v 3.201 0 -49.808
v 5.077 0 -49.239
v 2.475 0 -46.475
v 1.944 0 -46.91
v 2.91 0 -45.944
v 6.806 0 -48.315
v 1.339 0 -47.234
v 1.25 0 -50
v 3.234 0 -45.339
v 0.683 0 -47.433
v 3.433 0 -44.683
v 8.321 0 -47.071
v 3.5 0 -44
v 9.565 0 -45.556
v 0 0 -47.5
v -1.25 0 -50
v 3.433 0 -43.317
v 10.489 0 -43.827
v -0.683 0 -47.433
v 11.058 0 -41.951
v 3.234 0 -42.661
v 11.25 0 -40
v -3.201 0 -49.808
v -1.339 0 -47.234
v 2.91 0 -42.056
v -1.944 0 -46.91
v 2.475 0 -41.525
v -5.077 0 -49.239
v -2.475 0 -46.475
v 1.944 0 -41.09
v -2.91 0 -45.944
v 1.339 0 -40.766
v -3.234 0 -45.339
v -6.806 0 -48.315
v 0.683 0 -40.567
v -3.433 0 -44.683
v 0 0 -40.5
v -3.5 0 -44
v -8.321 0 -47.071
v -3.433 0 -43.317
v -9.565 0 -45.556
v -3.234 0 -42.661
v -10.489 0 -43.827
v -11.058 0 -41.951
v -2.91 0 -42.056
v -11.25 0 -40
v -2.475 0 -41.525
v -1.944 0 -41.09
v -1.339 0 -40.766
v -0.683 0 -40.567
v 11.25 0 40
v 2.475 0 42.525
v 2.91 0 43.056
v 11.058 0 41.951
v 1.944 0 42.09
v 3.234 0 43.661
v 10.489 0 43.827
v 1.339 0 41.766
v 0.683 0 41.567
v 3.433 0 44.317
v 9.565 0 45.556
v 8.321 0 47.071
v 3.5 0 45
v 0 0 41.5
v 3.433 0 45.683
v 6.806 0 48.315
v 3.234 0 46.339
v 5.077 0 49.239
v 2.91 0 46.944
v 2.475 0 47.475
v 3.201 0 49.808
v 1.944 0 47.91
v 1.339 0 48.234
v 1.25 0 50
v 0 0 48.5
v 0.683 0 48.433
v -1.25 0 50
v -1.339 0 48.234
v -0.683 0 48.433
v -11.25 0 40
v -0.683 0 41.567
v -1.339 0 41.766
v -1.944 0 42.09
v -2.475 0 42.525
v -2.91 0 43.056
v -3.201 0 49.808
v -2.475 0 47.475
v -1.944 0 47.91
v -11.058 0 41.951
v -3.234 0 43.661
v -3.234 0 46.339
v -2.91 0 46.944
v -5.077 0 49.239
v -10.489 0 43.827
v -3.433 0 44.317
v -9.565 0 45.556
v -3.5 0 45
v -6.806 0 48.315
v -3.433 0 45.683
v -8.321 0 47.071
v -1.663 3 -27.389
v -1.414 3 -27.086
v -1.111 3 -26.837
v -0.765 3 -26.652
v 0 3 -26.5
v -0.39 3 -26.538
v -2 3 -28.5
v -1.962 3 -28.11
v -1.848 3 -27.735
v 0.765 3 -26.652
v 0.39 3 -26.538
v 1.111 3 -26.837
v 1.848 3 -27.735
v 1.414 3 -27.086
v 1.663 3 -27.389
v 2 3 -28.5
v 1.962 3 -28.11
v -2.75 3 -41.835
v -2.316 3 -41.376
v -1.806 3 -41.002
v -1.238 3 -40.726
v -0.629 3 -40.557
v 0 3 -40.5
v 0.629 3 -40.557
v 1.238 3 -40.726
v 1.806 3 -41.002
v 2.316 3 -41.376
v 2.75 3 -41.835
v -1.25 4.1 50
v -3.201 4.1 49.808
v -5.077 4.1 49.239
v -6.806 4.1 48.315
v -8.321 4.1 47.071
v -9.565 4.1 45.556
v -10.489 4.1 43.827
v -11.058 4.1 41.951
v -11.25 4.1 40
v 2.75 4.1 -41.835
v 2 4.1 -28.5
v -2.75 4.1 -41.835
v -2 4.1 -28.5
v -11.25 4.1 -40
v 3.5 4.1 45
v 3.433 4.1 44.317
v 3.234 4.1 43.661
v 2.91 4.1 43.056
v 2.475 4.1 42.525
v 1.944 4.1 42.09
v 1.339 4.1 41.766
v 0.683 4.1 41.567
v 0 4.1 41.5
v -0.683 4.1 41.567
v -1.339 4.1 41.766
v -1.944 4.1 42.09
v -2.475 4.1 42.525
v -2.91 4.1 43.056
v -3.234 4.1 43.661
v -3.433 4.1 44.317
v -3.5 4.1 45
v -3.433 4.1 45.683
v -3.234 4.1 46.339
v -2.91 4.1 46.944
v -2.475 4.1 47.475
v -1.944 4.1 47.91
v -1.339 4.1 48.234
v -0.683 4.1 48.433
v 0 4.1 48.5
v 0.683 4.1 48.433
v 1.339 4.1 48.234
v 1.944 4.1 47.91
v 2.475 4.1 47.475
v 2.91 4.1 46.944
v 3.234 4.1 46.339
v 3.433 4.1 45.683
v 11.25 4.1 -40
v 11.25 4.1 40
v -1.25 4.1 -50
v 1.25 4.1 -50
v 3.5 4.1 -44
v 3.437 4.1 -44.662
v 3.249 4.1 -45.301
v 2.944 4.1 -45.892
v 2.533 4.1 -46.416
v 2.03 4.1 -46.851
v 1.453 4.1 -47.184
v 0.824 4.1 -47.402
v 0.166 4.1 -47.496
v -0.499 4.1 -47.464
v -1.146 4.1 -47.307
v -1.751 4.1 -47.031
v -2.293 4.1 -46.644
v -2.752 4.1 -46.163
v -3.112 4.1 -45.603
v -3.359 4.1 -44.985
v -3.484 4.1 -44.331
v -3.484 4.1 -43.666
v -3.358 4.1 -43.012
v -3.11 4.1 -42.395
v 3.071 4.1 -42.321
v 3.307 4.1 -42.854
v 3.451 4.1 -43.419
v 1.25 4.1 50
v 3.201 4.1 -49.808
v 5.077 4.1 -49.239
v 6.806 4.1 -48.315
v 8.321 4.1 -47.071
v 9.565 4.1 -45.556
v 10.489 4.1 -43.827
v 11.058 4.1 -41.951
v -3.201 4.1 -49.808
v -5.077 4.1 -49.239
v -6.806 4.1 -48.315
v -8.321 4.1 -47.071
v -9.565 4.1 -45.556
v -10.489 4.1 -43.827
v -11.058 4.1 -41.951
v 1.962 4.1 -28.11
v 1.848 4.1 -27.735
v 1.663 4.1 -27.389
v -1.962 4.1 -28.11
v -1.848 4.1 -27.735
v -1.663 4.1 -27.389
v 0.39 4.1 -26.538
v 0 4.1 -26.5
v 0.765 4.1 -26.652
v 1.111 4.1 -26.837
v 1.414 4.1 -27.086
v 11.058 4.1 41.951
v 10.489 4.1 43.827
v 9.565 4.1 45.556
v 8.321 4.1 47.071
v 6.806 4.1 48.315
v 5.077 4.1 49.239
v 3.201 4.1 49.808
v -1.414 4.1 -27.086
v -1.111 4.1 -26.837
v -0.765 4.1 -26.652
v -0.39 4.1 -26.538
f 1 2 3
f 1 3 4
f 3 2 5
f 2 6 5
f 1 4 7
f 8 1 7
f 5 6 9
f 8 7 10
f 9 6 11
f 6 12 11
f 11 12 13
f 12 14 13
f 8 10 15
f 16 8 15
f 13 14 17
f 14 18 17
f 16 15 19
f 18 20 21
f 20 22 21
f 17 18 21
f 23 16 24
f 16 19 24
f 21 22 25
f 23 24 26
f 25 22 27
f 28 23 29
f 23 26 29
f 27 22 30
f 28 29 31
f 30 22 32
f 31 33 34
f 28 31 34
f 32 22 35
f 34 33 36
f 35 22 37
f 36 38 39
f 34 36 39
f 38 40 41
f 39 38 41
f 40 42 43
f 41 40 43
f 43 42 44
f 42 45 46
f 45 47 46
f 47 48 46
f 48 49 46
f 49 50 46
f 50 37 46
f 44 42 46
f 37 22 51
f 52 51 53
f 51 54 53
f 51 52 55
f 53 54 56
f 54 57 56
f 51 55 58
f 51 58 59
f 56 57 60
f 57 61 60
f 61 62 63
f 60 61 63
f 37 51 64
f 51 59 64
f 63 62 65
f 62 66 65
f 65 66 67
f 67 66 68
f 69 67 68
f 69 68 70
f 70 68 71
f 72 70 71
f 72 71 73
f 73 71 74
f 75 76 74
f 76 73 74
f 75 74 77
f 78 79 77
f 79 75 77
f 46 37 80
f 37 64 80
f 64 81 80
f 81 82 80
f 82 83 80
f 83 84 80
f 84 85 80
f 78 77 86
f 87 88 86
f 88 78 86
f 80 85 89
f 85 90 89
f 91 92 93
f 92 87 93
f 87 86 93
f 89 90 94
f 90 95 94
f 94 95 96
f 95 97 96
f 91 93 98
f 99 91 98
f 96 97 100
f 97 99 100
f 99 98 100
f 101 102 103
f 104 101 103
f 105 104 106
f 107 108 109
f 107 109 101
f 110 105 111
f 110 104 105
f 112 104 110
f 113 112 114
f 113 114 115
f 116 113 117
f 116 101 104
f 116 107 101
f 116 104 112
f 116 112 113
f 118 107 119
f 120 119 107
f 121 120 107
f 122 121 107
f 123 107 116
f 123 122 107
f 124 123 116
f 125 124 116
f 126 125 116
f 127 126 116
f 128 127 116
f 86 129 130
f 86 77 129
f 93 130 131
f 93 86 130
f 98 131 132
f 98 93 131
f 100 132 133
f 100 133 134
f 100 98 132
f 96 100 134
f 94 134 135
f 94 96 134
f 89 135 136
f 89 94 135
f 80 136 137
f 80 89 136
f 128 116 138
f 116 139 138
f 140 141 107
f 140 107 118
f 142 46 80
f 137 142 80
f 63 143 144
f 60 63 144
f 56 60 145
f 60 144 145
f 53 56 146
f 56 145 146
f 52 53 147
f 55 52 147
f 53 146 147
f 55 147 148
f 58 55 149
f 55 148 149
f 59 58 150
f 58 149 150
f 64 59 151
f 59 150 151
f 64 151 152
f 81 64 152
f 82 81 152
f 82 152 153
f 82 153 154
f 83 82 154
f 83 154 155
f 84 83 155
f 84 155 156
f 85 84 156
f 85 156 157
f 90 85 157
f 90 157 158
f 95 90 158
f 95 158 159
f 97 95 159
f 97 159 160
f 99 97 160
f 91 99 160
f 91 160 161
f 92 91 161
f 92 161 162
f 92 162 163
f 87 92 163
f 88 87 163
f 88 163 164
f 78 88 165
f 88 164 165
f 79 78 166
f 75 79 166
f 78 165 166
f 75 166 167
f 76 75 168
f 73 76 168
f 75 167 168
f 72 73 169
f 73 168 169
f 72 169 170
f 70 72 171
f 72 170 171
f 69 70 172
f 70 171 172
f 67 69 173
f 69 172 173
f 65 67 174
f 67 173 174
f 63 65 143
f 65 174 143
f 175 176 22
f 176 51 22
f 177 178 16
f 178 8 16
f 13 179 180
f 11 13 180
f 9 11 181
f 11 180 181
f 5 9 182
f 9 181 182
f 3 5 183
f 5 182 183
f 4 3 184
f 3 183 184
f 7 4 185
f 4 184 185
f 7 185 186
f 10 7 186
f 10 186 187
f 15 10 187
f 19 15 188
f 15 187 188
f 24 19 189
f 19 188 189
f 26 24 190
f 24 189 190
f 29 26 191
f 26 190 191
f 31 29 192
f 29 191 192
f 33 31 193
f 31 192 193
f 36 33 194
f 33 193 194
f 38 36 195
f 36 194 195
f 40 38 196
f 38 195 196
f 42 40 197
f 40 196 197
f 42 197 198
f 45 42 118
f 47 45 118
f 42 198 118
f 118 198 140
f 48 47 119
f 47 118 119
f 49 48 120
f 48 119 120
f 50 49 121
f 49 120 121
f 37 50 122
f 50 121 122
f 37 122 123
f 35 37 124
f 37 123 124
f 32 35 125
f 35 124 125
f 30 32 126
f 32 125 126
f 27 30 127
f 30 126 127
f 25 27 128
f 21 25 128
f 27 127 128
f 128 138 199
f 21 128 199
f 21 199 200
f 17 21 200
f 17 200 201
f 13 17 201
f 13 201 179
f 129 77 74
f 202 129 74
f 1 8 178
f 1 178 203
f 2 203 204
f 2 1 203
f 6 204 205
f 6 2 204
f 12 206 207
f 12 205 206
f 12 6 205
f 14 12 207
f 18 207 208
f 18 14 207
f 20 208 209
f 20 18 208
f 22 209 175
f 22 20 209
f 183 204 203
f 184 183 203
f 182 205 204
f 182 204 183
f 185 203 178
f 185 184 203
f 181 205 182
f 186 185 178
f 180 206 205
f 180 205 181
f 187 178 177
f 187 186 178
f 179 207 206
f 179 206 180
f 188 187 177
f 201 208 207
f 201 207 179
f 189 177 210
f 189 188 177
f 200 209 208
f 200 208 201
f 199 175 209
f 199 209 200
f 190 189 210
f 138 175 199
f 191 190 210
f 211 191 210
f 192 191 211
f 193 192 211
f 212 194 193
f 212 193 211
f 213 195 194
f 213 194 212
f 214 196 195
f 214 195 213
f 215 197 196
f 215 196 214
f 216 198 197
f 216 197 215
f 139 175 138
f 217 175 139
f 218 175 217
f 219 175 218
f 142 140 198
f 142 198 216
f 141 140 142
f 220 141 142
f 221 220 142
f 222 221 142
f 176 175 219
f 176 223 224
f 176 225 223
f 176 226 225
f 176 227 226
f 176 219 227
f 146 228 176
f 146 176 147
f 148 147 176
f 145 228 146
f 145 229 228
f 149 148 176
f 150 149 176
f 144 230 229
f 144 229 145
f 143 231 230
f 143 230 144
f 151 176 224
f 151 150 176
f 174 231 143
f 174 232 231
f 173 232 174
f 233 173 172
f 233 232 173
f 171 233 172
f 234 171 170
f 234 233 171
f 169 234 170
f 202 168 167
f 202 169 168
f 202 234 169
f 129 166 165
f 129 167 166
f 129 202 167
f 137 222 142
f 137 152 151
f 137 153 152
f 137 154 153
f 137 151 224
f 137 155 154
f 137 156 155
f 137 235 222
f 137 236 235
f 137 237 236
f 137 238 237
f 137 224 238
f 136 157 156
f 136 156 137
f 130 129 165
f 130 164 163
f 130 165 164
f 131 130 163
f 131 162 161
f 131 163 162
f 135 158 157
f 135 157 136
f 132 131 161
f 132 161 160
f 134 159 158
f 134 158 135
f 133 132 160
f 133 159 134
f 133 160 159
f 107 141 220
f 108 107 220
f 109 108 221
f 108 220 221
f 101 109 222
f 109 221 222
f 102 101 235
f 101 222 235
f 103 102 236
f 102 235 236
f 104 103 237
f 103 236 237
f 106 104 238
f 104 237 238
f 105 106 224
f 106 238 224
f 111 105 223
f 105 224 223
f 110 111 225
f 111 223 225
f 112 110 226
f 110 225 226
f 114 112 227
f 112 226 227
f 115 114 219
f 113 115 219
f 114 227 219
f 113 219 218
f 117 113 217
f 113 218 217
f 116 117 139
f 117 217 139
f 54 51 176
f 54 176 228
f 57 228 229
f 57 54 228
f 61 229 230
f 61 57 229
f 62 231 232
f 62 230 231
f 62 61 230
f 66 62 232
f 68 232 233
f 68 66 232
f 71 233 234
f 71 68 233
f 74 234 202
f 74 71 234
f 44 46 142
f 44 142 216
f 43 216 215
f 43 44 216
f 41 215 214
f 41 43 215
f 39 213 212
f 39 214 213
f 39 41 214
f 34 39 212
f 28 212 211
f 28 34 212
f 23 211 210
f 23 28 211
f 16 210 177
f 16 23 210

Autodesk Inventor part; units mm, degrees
ref_plane "YZ Plane" through (0, 0, 0) normal (1, 0, 0) x (0, 1, 0)
ref_plane "XZ Plane" through (0, 0, 0) normal (0, 1, 0) x (-1, 0, 0)
ref_plane "XY Plane" through (0, 0, 0) normal (0, 0, 1) x (1, 0, 0)
sketch "Szkic1" plane through (0, 0, 0) normal (0, 1, 0) x (-1, 0, 0)
  line L0 (1.25, 50) -> (-1.25, 50)
  line L1 (-11.25, 40) -> (-11.25, -40)
  line L2 (-1.25, -50) -> (1.25, -50)
  line L3 (11.25, -40) -> (11.25, 40)
  line L4 (11.25, 50) -> (-11.25, -50)
  line L5 (11.25, -50) -> (-11.25, 50)
  arc A0 (11.25, 40) -> (1.25, 50) centre (1.25, 40) ccw
  arc A1 (-1.25, 50) -> (-11.25, 40) centre (-1.25, 40) ccw
  arc A2 (1.25, -50) -> (11.25, -40) centre (1.25, -40) ccw
  arc A3 (-11.25, -40) -> (-1.25, -50) centre (-1.25, -40) ccw
  point P0 (0, 0)
  point P1 (0, 0)
  dimension "d0" = 22.5
  dimension "d1" = 100
  dimension "d2" = 10
extrude "Wyciągnięcie proste1" add sketch "Szkic1" along normal blind 4.1
sketch "Szkic2" plane through (0, 4.1, 0) normal (0, 1, 0) x (1, 0, 0)
  circle A0 centre (0, 44) radius 3.5
  line L0 (1.25, 50) -> (-1.25, 50) projected
  point P0 (0, 0)
  point P1 (0, 50)
  dimension "d5" = 7
  dimension "d14" = 6
extrude "Wyciągnięcie proste2" cut sketch "Szkic2" against normal blind 8
sketch "Szkic3" plane through (0, 4.1, 0) normal (0, 1, 0) x (1, 0, 0)
  line L0 (0, 47.5) -> (0, 28.5)
  arc A0 (-2, 28.5) -> (2, 28.5) centre (0, 28.5) ccw
  line L1 (-2.75, 41.8349) -> (0, 41.8349)
  line L2 (1.25, 50) -> (-1.25, 50) projected
  line L3 (-2, 28.5) -> (-2.75, 41.8349)
  line L4 (2, 28.5) -> (2.75, 41.8349)
  line L5 (0, 41.8349) -> (2.75, 41.8349)
  circle A1 centre (0, 44) radius 3.5 projected
  point P0 (0, 0)
  point P1 (0, 50)
  dimension "d8" = 19
  dimension "d10" = 5.5
extrude "Wyciągnięcie proste3" cut sketch "Szkic3" against normal blind 1.1 contours L5 A1 L0 | L0 A1 L1 | A1 L4 A0 L3 picked at (1.6483, 41.6479) picked at (-1.6483, 41.6479)
sketch "Szkic4" plane through (0, 4.1, 0) normal (0, 1, 0) x (1, 0, 0)
  circle A0 centre (0, -45) radius 3.5
  line L0 (-1.25, -50) -> (1.25, -50) projected
  point P0 (0, 0)
  point P1 (0, -50)
  dimension "d15" = 7
  dimension "d16" = 5
extrude "Wyciągnięcie proste4" cut sketch "Szkic4" against normal blind 10
properties part number "arm_big_part"
